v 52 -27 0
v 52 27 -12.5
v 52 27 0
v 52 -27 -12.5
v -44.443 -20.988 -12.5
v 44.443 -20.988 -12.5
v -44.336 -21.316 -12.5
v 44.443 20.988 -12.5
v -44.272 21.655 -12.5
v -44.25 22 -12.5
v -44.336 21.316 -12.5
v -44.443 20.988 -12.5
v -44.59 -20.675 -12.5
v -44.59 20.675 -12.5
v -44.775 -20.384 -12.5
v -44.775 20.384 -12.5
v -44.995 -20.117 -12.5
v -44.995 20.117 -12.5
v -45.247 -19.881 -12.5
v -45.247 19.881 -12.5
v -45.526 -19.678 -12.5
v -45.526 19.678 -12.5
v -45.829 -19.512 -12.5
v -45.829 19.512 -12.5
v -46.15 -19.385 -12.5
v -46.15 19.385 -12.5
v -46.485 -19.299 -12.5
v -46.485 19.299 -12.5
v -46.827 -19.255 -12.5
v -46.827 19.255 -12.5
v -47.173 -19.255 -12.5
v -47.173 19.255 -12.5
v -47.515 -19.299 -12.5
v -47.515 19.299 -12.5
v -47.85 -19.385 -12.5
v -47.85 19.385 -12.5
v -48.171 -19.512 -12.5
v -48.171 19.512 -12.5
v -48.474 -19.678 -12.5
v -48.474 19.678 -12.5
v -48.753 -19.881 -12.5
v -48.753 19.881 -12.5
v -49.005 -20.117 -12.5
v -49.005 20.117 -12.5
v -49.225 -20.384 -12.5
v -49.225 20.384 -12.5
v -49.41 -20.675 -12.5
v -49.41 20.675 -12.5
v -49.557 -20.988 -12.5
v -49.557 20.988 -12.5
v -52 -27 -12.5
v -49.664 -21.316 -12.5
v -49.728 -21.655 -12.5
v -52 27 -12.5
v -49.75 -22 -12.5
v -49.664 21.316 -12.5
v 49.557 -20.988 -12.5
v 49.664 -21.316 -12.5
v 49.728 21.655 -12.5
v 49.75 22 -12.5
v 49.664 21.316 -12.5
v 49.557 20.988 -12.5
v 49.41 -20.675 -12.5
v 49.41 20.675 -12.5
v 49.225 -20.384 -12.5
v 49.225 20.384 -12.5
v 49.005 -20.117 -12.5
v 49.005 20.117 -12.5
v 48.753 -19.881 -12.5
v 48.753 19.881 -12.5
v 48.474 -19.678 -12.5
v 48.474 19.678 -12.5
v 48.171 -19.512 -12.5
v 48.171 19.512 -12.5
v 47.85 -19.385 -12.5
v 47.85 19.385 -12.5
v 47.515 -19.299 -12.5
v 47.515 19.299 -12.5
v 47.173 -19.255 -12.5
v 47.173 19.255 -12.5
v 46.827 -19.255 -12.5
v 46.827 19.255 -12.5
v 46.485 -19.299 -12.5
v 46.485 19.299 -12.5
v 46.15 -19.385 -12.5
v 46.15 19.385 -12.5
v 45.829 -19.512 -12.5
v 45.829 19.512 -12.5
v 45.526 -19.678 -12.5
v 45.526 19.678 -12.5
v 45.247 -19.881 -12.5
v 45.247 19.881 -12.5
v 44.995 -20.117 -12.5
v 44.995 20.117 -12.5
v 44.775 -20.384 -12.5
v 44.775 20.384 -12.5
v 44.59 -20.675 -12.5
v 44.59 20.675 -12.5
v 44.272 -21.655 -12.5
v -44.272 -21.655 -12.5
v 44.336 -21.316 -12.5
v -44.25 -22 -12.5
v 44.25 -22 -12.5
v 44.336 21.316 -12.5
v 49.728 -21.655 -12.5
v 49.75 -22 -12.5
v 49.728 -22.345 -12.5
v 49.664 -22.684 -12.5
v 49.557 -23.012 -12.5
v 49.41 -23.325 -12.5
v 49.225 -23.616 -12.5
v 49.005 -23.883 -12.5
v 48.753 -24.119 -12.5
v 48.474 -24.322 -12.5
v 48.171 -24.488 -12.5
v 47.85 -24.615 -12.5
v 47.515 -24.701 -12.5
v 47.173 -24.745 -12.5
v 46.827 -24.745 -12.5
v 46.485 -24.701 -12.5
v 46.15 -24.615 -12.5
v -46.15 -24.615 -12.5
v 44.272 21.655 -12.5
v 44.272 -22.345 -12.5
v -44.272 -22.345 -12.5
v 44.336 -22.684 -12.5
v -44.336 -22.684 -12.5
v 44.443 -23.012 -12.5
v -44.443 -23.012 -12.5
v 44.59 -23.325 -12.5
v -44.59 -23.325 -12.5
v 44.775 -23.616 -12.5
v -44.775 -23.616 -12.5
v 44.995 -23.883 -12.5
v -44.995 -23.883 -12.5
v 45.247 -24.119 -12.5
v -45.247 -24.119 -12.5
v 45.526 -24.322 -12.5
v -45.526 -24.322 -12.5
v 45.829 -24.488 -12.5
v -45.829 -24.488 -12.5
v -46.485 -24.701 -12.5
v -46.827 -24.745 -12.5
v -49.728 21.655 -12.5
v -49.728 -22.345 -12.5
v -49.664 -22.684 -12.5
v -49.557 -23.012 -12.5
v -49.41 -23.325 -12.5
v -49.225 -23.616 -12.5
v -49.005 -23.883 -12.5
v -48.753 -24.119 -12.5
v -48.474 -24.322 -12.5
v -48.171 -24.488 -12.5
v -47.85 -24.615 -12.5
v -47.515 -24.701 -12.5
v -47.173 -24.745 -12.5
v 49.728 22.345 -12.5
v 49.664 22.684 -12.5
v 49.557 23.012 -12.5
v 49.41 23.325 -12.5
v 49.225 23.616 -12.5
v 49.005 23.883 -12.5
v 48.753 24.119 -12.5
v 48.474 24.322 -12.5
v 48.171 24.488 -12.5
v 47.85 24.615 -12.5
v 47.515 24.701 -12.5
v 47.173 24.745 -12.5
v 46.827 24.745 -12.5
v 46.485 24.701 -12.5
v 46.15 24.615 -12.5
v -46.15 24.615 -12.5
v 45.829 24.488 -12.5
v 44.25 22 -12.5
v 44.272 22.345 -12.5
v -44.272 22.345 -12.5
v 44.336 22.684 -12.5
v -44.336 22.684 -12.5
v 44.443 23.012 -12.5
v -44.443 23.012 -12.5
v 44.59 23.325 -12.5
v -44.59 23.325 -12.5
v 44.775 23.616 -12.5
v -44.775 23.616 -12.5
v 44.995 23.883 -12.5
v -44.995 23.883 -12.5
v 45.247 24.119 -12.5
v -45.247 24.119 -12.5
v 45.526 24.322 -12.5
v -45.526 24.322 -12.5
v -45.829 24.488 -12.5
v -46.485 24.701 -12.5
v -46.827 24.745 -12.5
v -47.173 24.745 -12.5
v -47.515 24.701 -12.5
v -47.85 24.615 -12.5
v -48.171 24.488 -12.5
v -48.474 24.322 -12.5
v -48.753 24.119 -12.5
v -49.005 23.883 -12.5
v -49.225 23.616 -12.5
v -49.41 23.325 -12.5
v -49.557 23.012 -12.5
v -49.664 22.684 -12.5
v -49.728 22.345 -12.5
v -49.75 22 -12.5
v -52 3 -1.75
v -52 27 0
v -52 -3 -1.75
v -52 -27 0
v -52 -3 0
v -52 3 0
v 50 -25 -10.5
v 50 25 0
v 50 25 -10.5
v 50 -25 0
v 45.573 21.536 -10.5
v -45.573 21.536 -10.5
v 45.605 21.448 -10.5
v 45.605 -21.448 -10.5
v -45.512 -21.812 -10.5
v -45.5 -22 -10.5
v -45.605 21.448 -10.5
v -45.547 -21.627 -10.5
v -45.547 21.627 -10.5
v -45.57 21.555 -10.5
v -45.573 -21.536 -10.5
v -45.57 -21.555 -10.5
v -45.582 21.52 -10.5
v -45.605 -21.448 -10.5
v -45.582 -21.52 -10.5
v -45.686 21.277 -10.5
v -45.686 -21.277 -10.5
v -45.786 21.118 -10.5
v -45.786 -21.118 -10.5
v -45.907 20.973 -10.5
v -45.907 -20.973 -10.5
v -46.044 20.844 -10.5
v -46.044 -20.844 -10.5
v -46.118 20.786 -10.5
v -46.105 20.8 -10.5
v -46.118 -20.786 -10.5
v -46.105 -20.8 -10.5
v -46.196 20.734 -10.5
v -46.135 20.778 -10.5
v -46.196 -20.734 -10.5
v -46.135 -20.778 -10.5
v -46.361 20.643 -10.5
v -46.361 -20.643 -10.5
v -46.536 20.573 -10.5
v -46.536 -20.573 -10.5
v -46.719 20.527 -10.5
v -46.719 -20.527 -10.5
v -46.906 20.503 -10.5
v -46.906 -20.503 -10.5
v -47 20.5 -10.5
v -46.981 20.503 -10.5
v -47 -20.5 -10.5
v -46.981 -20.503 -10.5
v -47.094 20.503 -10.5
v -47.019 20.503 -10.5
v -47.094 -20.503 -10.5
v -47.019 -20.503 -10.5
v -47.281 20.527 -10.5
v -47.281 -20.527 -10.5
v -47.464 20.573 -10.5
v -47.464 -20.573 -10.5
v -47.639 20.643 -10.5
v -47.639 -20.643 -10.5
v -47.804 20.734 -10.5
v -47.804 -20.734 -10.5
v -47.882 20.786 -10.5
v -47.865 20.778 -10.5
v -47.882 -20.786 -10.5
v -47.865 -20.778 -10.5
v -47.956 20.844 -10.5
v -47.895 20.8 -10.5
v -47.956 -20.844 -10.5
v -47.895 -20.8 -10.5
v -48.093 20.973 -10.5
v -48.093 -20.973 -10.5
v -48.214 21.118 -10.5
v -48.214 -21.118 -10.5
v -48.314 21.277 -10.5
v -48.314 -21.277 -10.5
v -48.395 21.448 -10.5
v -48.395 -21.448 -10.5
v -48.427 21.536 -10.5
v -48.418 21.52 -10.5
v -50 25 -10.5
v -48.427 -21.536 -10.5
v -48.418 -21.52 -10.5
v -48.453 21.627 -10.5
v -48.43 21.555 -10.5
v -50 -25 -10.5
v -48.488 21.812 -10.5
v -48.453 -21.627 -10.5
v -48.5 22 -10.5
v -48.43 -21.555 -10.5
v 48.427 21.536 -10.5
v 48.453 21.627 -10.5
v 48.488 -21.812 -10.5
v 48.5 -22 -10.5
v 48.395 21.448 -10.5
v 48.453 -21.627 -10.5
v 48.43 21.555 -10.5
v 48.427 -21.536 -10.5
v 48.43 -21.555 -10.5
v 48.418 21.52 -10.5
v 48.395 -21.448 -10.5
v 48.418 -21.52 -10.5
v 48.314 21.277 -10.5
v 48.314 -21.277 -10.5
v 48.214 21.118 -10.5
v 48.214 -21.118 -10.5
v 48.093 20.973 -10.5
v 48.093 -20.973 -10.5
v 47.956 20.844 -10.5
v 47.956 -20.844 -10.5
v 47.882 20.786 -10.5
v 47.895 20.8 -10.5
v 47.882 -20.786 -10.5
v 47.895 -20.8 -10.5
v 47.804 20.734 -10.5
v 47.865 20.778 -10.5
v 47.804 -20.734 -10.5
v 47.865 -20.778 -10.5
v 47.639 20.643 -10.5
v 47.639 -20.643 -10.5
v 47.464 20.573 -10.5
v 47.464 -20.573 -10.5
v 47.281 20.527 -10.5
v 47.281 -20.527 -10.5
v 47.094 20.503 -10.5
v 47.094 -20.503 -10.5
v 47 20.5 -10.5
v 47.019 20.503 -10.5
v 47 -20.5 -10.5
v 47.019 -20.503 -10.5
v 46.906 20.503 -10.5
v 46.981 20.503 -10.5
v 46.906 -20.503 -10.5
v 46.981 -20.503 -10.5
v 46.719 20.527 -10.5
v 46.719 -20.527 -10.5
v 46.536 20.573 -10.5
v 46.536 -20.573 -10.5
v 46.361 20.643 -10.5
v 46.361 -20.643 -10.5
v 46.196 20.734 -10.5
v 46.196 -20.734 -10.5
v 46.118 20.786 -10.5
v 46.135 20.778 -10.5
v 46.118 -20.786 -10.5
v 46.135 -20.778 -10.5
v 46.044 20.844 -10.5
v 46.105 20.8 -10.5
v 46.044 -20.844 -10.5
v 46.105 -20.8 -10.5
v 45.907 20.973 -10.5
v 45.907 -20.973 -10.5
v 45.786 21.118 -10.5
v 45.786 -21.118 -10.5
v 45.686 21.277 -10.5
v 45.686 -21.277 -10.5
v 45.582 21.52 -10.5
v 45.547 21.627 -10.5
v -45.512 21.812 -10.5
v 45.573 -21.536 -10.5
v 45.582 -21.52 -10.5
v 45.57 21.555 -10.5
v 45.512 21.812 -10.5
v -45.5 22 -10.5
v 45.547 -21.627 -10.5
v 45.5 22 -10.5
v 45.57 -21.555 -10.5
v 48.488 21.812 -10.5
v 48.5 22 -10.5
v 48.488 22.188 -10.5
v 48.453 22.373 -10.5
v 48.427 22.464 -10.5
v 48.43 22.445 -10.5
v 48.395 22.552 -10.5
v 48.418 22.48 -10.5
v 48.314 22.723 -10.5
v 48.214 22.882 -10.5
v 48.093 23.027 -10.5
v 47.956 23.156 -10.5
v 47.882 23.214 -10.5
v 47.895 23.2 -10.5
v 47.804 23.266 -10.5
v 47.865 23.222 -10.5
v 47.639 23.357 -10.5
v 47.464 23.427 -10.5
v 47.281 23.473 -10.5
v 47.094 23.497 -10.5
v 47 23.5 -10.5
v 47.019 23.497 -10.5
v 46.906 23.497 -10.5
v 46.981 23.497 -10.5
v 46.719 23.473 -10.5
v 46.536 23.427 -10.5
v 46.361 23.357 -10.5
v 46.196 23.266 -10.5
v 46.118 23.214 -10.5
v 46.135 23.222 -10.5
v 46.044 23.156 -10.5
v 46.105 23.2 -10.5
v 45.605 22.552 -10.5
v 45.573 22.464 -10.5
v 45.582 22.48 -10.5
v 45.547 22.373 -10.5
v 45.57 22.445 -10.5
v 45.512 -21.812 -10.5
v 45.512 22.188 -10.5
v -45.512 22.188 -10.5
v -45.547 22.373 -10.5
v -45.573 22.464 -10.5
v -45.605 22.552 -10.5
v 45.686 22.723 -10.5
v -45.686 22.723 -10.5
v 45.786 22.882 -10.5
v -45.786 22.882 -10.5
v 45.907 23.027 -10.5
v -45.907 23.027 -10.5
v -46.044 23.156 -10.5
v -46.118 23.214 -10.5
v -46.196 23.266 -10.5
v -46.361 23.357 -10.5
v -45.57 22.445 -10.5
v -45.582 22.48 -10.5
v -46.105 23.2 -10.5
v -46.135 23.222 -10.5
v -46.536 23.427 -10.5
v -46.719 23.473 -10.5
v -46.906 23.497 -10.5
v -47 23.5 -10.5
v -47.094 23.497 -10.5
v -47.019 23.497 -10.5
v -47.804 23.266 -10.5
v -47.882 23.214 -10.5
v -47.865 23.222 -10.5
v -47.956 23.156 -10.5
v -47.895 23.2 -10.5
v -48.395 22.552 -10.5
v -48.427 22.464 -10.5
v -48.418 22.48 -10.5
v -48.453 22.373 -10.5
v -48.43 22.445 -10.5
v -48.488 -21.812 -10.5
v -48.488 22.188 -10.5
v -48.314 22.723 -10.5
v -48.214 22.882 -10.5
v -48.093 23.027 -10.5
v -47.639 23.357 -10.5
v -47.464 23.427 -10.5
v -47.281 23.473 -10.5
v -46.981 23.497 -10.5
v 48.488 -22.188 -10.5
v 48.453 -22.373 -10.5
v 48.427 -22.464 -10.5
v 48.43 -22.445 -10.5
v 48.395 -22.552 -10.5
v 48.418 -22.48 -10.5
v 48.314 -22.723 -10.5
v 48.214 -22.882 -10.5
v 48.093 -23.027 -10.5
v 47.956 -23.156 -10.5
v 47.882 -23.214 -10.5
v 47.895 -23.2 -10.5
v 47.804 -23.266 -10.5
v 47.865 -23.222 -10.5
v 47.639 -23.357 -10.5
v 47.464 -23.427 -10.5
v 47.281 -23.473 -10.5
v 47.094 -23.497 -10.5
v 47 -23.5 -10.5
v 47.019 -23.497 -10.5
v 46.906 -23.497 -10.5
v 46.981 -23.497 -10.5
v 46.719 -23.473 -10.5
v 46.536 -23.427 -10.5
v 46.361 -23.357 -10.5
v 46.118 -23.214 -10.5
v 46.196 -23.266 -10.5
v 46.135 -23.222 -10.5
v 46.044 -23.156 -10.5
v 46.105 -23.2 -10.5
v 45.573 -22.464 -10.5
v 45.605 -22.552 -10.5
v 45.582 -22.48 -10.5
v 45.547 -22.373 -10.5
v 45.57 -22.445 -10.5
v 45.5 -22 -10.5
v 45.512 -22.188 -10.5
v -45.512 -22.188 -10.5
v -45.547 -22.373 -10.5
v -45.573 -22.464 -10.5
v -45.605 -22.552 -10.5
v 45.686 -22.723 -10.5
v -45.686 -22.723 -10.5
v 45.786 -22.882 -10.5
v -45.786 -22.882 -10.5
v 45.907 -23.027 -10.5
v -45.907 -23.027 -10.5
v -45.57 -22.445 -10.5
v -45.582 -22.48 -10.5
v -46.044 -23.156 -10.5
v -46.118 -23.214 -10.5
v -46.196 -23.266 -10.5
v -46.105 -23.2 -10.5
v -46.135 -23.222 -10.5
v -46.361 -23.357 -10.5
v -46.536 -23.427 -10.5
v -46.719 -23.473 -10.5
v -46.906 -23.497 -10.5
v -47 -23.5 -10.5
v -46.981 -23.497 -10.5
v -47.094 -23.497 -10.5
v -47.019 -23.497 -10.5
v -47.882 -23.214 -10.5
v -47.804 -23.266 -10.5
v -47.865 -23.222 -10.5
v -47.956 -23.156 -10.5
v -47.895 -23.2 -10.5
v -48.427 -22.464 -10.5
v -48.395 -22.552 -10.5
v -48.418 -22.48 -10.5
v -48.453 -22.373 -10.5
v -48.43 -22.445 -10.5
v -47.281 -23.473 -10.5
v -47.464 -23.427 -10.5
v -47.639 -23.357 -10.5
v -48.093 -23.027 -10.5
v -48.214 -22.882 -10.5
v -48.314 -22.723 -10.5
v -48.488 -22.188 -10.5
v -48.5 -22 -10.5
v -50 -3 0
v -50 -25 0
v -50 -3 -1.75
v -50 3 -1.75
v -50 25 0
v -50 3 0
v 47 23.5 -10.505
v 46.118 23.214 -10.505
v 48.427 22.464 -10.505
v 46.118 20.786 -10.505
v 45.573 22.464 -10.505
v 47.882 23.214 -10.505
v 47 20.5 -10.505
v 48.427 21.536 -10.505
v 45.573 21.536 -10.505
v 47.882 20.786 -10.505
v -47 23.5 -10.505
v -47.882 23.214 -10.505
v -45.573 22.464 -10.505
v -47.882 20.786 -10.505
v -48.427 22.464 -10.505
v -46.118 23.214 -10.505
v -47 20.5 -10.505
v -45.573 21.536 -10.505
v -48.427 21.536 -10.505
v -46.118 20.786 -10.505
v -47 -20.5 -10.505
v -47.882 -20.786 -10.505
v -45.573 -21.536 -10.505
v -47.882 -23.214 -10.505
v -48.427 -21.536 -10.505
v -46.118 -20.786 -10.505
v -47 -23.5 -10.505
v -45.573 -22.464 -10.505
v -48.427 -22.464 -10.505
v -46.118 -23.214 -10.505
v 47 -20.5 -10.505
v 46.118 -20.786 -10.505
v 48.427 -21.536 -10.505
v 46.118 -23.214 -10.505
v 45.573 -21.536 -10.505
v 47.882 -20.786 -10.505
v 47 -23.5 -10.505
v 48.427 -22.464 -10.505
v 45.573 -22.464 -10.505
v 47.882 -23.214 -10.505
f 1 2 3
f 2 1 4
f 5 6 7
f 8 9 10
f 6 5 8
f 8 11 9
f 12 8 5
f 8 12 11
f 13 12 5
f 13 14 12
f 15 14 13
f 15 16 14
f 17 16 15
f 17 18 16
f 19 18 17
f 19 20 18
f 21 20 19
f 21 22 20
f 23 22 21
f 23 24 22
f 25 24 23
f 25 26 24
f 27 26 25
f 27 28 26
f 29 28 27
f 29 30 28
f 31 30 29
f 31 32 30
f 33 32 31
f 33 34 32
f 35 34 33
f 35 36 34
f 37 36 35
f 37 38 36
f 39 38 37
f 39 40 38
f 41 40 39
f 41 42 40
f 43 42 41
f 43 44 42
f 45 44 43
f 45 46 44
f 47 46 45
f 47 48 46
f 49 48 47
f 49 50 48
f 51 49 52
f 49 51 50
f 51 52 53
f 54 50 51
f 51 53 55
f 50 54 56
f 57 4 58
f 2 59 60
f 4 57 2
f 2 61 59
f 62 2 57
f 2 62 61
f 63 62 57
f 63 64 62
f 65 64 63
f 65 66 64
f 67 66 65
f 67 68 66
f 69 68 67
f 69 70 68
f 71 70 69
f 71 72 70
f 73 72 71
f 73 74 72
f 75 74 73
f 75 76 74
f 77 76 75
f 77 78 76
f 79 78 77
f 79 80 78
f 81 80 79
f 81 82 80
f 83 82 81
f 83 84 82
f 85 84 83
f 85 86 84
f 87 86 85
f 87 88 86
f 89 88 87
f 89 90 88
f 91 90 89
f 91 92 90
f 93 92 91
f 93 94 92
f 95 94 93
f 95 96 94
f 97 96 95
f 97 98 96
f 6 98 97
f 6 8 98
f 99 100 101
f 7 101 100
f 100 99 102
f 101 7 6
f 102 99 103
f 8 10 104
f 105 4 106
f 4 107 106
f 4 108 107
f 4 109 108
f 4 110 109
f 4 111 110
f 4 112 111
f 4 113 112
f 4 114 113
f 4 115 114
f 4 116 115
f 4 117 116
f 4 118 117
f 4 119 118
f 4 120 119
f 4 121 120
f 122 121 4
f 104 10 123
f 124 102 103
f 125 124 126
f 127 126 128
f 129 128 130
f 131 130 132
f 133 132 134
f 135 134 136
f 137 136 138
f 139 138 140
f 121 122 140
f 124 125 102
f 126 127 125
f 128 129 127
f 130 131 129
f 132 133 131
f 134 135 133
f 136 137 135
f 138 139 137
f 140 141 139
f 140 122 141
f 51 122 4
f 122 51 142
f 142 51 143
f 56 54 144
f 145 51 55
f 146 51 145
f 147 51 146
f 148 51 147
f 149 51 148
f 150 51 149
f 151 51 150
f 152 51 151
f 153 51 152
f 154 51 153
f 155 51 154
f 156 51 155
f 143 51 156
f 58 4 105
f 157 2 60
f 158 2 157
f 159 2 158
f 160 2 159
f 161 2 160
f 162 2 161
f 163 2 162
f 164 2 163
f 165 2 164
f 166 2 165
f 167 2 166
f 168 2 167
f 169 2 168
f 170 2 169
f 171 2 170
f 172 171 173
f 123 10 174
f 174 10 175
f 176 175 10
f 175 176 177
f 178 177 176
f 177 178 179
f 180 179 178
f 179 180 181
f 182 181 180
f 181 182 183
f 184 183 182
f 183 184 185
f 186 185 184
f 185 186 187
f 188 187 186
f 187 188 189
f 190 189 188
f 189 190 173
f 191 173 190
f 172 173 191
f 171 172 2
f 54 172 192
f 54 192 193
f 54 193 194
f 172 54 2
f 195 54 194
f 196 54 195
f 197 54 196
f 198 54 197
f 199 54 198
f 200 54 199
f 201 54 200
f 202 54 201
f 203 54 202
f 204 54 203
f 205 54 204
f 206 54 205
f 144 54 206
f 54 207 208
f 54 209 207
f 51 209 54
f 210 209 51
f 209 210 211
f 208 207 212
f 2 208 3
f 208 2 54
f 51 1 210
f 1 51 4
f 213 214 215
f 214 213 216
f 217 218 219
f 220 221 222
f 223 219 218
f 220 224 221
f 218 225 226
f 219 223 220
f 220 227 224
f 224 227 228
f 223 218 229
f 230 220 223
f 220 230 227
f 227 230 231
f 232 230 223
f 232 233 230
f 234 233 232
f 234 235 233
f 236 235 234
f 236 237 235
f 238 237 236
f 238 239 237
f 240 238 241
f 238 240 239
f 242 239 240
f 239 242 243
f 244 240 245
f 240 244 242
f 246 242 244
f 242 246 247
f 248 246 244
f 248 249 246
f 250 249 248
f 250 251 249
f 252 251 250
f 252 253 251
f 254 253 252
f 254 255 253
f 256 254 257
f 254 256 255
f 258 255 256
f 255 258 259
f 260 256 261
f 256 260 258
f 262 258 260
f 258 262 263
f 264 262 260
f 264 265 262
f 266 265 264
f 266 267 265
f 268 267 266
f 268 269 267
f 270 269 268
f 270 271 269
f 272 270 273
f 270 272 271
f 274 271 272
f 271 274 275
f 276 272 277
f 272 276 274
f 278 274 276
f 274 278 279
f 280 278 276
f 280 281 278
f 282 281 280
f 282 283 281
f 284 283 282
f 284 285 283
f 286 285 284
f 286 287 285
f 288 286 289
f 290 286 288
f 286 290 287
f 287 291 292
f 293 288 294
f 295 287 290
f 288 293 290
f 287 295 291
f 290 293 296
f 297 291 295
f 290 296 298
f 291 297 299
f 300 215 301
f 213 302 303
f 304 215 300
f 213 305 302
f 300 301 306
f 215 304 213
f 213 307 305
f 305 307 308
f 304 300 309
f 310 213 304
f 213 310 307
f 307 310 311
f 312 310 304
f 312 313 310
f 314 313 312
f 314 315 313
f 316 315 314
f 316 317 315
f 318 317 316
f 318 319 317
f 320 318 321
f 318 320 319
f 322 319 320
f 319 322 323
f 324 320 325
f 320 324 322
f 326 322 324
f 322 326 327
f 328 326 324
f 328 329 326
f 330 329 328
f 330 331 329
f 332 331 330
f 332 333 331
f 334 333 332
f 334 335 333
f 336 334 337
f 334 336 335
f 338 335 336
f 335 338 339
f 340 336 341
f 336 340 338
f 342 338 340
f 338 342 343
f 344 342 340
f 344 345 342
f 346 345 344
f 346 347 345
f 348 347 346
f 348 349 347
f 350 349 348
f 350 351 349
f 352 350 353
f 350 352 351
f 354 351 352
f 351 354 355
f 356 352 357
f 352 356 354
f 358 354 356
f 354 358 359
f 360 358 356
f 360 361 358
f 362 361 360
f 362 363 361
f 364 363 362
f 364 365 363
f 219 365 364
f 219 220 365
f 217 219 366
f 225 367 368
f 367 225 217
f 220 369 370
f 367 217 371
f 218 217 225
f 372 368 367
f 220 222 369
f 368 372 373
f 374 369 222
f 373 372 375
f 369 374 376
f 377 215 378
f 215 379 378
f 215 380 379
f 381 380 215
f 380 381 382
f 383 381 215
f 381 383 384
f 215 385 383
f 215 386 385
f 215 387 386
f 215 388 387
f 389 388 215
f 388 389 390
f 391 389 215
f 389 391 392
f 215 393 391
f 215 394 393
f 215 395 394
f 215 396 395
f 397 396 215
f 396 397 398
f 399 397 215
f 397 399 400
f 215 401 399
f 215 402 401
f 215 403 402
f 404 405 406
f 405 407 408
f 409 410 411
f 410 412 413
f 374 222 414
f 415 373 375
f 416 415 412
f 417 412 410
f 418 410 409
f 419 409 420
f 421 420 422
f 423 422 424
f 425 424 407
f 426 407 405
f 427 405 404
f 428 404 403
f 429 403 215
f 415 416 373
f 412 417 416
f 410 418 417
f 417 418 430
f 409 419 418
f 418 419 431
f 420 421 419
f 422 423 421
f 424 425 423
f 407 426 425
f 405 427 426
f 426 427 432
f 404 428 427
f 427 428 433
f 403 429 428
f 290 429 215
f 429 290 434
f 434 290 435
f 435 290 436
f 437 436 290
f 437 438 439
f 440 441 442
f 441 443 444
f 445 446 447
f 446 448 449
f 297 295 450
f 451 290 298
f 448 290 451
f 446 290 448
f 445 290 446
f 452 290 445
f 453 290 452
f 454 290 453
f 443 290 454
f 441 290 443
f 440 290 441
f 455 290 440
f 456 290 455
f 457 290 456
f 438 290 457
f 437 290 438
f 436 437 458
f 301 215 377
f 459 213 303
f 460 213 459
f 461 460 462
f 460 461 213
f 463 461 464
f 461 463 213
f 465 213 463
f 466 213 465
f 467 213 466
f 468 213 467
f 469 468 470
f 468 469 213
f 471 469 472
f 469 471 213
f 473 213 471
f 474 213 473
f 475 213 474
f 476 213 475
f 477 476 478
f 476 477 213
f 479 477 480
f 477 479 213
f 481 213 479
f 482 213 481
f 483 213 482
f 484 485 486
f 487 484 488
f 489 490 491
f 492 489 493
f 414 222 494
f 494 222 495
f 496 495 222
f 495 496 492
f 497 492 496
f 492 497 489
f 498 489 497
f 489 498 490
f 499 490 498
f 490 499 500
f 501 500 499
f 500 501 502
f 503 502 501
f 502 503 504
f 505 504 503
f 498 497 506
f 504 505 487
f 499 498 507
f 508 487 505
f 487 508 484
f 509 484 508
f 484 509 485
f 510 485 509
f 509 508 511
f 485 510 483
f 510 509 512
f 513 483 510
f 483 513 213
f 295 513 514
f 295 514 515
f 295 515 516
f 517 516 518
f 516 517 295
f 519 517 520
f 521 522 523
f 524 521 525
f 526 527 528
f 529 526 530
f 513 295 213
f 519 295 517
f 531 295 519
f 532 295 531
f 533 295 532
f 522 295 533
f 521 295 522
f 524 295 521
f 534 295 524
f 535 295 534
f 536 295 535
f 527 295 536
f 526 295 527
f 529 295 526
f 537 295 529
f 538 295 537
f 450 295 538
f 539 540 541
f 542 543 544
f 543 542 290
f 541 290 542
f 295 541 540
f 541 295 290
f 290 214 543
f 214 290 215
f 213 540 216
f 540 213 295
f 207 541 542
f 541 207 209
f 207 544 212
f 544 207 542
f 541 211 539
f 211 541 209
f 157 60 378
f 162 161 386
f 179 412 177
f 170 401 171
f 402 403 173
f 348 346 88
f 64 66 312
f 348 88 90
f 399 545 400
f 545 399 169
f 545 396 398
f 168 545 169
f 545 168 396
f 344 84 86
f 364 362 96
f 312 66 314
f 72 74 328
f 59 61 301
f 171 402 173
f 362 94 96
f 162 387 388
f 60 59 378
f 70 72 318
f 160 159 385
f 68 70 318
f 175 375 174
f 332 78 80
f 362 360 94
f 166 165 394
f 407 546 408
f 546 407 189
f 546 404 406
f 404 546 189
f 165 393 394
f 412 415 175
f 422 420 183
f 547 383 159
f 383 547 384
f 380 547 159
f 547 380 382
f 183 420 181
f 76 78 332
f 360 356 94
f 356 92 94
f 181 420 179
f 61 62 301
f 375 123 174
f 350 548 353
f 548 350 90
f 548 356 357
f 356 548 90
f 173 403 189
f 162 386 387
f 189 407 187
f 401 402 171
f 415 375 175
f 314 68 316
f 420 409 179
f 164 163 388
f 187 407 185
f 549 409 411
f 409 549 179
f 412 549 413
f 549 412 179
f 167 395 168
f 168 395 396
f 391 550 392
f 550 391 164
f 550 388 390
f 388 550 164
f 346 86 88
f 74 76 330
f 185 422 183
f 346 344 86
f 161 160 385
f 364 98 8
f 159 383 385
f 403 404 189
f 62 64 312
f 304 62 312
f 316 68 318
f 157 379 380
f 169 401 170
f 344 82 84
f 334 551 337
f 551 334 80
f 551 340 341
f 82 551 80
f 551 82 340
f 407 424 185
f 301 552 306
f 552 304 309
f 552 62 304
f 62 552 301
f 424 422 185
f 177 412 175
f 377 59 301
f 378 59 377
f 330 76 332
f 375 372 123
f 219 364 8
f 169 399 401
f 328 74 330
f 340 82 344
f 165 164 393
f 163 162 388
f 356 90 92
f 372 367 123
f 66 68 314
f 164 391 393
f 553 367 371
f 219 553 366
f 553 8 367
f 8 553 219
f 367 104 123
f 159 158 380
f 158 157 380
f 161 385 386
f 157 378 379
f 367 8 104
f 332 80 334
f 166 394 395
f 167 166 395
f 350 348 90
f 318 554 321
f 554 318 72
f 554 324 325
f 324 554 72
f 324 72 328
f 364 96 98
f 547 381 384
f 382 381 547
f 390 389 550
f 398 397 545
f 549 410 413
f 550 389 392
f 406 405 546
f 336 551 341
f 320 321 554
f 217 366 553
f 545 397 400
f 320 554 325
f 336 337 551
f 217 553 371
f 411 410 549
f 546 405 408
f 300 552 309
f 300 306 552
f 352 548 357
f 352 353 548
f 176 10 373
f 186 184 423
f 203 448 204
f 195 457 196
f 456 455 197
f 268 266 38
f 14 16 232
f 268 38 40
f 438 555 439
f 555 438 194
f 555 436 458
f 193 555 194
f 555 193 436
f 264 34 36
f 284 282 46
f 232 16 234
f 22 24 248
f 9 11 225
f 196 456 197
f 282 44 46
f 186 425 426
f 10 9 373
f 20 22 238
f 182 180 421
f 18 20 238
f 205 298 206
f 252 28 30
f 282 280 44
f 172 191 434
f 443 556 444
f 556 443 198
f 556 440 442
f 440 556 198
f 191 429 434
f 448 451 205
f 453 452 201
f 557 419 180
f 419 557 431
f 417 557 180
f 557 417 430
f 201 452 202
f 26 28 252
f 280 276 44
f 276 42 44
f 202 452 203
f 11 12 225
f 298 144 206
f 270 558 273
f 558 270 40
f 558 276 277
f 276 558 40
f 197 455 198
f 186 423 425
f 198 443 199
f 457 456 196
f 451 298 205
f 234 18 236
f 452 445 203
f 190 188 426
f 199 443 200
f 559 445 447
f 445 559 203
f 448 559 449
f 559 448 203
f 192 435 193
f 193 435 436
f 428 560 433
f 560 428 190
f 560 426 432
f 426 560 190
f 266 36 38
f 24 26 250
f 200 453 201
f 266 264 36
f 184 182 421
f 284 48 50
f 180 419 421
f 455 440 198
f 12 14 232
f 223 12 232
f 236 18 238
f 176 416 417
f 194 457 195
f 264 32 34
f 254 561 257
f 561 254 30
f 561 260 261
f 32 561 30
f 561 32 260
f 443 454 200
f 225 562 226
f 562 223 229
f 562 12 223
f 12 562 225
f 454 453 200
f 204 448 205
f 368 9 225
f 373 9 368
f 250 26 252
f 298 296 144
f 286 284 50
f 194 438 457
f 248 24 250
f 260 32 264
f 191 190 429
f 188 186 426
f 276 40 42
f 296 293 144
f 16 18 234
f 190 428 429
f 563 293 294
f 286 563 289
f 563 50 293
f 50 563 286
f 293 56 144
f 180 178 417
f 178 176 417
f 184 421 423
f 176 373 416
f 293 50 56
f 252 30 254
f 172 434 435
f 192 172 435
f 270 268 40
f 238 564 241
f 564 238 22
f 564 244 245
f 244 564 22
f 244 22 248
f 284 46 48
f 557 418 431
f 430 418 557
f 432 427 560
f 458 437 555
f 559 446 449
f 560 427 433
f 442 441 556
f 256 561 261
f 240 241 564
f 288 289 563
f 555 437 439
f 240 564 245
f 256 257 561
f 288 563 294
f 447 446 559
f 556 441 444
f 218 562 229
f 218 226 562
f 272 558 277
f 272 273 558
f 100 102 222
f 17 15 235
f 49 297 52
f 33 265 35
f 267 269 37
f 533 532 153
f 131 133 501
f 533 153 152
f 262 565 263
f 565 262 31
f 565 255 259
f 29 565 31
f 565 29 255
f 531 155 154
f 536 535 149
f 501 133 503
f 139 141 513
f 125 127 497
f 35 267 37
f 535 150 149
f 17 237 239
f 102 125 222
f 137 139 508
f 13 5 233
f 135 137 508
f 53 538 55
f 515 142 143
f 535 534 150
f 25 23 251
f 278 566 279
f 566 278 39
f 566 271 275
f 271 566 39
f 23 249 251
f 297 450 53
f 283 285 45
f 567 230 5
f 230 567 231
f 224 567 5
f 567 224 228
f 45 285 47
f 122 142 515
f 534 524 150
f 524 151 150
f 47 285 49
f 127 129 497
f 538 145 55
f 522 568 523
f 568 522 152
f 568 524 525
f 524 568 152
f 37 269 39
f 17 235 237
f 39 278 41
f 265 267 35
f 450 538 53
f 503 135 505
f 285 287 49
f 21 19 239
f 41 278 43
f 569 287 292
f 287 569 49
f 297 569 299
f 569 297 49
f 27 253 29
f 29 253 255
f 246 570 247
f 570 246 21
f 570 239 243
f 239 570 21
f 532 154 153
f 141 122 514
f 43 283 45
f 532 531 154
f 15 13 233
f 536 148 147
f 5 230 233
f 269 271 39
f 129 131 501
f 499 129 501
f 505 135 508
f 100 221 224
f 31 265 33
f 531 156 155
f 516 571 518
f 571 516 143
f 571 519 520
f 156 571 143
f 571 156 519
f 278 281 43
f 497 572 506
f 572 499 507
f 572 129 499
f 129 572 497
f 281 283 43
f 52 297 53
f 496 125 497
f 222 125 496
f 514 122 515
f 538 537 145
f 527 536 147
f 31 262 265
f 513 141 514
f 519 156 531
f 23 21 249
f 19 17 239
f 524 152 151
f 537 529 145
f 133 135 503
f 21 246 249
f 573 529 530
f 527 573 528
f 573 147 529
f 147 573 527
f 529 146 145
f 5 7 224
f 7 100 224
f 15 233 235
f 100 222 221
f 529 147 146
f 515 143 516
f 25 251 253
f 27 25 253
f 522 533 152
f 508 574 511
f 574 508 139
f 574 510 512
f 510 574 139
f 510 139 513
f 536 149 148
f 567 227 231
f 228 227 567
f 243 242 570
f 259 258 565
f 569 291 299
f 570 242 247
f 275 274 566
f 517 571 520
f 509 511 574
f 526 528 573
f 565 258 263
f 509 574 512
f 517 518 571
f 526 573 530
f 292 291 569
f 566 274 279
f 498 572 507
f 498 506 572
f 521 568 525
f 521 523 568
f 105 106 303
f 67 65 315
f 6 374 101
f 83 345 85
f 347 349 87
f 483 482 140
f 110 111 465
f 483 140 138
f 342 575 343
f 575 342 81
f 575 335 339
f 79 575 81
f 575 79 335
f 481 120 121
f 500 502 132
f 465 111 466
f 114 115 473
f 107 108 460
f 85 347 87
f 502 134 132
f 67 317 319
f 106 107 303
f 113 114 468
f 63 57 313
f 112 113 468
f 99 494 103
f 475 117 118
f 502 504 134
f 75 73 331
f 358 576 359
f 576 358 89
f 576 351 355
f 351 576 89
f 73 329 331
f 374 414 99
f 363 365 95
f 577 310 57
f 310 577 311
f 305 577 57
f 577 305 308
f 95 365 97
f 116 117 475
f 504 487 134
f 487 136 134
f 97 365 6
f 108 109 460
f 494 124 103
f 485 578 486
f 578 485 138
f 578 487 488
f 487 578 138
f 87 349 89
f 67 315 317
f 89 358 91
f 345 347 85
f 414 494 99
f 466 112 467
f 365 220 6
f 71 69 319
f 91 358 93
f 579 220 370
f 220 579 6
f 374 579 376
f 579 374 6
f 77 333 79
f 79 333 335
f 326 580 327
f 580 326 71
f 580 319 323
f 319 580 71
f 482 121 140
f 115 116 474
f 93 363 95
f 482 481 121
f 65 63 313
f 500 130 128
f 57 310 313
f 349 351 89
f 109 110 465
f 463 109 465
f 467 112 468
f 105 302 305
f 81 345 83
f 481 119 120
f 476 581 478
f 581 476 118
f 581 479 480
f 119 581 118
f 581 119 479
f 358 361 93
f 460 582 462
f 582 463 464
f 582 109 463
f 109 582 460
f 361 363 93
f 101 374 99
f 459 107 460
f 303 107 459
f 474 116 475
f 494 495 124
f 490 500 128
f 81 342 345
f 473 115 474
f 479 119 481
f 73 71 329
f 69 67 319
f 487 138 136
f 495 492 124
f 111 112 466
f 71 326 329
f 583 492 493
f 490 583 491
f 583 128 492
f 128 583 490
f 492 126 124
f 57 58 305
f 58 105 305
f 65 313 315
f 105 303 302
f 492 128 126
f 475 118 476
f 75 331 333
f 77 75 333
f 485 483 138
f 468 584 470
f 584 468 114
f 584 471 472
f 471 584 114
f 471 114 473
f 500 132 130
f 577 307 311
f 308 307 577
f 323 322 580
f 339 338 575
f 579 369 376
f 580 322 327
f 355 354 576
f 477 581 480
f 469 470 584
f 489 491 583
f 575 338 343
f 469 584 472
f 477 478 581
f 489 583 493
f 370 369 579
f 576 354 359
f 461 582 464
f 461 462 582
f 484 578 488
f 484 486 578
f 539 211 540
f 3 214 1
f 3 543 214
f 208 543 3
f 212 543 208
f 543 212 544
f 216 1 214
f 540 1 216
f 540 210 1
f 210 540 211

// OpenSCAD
epaisseur=2;
longueur=100;
largeur=50;
hauteur=42;
largeur_prise=20;
hauteur_prise=12.5;
hauteur_fil=3.5;
largeur_fil=6;
largeur_fix=6;

module vis(){
    cylinder(d1=5.5, d2=3, h=epaisseur, $fn=50);
    cylinder(d=3, h=10, $fn=20);
}

module insert_vis() {
    cylinder(d=4, h=3, $fn=20);
    cylinder(d=3, h=15, $fn=20);
}

module boite(){
    difference(){
        cube([longueur+2*epaisseur, largeur+2*epaisseur, hauteur+2*epaisseur], center=true);
        cube([longueur, largeur, hauteur], center=true);
        translate([longueur/2,0,0])
        cube([longueur, largeur_prise, hauteur_prise], center=true);
        translate([-longueur/2,0,-hauteur/4])
        cube([longueur, largeur_fil, hauteur_fil], center=true);
    }
    
}

module haut(){
    difference(){
        translate([0,0,hauteur/4])
        boite();
        translate([0,0,-(hauteur+2*epaisseur)/4])
        cube([longueur+3*epaisseur, largeur+3*epaisseur, (hauteur+2*epaisseur)/2], center=true);
    }
    translate([(longueur-largeur_fix)/2,(largeur-largeur_fix)/2,hauteur/4])
    difference(){
        cube([largeur_fix,largeur_fix,hauteur], center=true);
        translate([0,0,-hauteur/2])
        #insert_vis();
    }
    translate([-(longueur-largeur_fix)/2,(largeur-largeur_fix)/2,hauteur/4])
    difference(){
        cube([largeur_fix,largeur_fix,hauteur], center=true);
        translate([0,0,-hauteur/2])
        #insert_vis();
    }
    translate([-(longueur-largeur_fix)/2,-(largeur-largeur_fix)/2,hauteur/4])
    difference(){
        cube([largeur_fix,largeur_fix,hauteur], center=true);
        translate([0,0,-hauteur/2])
        #insert_vis();
    }
    translate([(longueur-largeur_fix)/2,-(largeur-largeur_fix)/2,hauteur/4])
    difference(){
        cube([largeur_fix,largeur_fix,hauteur], center=true);
        translate([0,0,-hauteur/2])
        #insert_vis();
    }
}

module bas(){
    difference(){
        translate([0,0,hauteur/4])
        boite();
        translate([0,0,(hauteur+2*epaisseur)/2])
        cube([longueur+3*epaisseur, largeur+3*epaisseur, (hauteur+2*epaisseur)], center=true);
        translate([(longueur-largeur_fix)/2,(largeur-largeur_fix)/2,-(hauteur/4+epaisseur)])
        #vis();
        translate([-(longueur-largeur_fix)/2,(largeur-largeur_fix)/2,-(hauteur/4+epaisseur)])
    #vis();
    translate([-(longueur-largeur_fix)/2,-(largeur-largeur_fix)/2,-(hauteur/4+epaisseur)])
    #vis();
    translate([(longueur-largeur_fix)/2,-(largeur-largeur_fix)/2,-(hauteur/4+epaisseur)])
    #vis();
    }
}
//haut();
bas();
